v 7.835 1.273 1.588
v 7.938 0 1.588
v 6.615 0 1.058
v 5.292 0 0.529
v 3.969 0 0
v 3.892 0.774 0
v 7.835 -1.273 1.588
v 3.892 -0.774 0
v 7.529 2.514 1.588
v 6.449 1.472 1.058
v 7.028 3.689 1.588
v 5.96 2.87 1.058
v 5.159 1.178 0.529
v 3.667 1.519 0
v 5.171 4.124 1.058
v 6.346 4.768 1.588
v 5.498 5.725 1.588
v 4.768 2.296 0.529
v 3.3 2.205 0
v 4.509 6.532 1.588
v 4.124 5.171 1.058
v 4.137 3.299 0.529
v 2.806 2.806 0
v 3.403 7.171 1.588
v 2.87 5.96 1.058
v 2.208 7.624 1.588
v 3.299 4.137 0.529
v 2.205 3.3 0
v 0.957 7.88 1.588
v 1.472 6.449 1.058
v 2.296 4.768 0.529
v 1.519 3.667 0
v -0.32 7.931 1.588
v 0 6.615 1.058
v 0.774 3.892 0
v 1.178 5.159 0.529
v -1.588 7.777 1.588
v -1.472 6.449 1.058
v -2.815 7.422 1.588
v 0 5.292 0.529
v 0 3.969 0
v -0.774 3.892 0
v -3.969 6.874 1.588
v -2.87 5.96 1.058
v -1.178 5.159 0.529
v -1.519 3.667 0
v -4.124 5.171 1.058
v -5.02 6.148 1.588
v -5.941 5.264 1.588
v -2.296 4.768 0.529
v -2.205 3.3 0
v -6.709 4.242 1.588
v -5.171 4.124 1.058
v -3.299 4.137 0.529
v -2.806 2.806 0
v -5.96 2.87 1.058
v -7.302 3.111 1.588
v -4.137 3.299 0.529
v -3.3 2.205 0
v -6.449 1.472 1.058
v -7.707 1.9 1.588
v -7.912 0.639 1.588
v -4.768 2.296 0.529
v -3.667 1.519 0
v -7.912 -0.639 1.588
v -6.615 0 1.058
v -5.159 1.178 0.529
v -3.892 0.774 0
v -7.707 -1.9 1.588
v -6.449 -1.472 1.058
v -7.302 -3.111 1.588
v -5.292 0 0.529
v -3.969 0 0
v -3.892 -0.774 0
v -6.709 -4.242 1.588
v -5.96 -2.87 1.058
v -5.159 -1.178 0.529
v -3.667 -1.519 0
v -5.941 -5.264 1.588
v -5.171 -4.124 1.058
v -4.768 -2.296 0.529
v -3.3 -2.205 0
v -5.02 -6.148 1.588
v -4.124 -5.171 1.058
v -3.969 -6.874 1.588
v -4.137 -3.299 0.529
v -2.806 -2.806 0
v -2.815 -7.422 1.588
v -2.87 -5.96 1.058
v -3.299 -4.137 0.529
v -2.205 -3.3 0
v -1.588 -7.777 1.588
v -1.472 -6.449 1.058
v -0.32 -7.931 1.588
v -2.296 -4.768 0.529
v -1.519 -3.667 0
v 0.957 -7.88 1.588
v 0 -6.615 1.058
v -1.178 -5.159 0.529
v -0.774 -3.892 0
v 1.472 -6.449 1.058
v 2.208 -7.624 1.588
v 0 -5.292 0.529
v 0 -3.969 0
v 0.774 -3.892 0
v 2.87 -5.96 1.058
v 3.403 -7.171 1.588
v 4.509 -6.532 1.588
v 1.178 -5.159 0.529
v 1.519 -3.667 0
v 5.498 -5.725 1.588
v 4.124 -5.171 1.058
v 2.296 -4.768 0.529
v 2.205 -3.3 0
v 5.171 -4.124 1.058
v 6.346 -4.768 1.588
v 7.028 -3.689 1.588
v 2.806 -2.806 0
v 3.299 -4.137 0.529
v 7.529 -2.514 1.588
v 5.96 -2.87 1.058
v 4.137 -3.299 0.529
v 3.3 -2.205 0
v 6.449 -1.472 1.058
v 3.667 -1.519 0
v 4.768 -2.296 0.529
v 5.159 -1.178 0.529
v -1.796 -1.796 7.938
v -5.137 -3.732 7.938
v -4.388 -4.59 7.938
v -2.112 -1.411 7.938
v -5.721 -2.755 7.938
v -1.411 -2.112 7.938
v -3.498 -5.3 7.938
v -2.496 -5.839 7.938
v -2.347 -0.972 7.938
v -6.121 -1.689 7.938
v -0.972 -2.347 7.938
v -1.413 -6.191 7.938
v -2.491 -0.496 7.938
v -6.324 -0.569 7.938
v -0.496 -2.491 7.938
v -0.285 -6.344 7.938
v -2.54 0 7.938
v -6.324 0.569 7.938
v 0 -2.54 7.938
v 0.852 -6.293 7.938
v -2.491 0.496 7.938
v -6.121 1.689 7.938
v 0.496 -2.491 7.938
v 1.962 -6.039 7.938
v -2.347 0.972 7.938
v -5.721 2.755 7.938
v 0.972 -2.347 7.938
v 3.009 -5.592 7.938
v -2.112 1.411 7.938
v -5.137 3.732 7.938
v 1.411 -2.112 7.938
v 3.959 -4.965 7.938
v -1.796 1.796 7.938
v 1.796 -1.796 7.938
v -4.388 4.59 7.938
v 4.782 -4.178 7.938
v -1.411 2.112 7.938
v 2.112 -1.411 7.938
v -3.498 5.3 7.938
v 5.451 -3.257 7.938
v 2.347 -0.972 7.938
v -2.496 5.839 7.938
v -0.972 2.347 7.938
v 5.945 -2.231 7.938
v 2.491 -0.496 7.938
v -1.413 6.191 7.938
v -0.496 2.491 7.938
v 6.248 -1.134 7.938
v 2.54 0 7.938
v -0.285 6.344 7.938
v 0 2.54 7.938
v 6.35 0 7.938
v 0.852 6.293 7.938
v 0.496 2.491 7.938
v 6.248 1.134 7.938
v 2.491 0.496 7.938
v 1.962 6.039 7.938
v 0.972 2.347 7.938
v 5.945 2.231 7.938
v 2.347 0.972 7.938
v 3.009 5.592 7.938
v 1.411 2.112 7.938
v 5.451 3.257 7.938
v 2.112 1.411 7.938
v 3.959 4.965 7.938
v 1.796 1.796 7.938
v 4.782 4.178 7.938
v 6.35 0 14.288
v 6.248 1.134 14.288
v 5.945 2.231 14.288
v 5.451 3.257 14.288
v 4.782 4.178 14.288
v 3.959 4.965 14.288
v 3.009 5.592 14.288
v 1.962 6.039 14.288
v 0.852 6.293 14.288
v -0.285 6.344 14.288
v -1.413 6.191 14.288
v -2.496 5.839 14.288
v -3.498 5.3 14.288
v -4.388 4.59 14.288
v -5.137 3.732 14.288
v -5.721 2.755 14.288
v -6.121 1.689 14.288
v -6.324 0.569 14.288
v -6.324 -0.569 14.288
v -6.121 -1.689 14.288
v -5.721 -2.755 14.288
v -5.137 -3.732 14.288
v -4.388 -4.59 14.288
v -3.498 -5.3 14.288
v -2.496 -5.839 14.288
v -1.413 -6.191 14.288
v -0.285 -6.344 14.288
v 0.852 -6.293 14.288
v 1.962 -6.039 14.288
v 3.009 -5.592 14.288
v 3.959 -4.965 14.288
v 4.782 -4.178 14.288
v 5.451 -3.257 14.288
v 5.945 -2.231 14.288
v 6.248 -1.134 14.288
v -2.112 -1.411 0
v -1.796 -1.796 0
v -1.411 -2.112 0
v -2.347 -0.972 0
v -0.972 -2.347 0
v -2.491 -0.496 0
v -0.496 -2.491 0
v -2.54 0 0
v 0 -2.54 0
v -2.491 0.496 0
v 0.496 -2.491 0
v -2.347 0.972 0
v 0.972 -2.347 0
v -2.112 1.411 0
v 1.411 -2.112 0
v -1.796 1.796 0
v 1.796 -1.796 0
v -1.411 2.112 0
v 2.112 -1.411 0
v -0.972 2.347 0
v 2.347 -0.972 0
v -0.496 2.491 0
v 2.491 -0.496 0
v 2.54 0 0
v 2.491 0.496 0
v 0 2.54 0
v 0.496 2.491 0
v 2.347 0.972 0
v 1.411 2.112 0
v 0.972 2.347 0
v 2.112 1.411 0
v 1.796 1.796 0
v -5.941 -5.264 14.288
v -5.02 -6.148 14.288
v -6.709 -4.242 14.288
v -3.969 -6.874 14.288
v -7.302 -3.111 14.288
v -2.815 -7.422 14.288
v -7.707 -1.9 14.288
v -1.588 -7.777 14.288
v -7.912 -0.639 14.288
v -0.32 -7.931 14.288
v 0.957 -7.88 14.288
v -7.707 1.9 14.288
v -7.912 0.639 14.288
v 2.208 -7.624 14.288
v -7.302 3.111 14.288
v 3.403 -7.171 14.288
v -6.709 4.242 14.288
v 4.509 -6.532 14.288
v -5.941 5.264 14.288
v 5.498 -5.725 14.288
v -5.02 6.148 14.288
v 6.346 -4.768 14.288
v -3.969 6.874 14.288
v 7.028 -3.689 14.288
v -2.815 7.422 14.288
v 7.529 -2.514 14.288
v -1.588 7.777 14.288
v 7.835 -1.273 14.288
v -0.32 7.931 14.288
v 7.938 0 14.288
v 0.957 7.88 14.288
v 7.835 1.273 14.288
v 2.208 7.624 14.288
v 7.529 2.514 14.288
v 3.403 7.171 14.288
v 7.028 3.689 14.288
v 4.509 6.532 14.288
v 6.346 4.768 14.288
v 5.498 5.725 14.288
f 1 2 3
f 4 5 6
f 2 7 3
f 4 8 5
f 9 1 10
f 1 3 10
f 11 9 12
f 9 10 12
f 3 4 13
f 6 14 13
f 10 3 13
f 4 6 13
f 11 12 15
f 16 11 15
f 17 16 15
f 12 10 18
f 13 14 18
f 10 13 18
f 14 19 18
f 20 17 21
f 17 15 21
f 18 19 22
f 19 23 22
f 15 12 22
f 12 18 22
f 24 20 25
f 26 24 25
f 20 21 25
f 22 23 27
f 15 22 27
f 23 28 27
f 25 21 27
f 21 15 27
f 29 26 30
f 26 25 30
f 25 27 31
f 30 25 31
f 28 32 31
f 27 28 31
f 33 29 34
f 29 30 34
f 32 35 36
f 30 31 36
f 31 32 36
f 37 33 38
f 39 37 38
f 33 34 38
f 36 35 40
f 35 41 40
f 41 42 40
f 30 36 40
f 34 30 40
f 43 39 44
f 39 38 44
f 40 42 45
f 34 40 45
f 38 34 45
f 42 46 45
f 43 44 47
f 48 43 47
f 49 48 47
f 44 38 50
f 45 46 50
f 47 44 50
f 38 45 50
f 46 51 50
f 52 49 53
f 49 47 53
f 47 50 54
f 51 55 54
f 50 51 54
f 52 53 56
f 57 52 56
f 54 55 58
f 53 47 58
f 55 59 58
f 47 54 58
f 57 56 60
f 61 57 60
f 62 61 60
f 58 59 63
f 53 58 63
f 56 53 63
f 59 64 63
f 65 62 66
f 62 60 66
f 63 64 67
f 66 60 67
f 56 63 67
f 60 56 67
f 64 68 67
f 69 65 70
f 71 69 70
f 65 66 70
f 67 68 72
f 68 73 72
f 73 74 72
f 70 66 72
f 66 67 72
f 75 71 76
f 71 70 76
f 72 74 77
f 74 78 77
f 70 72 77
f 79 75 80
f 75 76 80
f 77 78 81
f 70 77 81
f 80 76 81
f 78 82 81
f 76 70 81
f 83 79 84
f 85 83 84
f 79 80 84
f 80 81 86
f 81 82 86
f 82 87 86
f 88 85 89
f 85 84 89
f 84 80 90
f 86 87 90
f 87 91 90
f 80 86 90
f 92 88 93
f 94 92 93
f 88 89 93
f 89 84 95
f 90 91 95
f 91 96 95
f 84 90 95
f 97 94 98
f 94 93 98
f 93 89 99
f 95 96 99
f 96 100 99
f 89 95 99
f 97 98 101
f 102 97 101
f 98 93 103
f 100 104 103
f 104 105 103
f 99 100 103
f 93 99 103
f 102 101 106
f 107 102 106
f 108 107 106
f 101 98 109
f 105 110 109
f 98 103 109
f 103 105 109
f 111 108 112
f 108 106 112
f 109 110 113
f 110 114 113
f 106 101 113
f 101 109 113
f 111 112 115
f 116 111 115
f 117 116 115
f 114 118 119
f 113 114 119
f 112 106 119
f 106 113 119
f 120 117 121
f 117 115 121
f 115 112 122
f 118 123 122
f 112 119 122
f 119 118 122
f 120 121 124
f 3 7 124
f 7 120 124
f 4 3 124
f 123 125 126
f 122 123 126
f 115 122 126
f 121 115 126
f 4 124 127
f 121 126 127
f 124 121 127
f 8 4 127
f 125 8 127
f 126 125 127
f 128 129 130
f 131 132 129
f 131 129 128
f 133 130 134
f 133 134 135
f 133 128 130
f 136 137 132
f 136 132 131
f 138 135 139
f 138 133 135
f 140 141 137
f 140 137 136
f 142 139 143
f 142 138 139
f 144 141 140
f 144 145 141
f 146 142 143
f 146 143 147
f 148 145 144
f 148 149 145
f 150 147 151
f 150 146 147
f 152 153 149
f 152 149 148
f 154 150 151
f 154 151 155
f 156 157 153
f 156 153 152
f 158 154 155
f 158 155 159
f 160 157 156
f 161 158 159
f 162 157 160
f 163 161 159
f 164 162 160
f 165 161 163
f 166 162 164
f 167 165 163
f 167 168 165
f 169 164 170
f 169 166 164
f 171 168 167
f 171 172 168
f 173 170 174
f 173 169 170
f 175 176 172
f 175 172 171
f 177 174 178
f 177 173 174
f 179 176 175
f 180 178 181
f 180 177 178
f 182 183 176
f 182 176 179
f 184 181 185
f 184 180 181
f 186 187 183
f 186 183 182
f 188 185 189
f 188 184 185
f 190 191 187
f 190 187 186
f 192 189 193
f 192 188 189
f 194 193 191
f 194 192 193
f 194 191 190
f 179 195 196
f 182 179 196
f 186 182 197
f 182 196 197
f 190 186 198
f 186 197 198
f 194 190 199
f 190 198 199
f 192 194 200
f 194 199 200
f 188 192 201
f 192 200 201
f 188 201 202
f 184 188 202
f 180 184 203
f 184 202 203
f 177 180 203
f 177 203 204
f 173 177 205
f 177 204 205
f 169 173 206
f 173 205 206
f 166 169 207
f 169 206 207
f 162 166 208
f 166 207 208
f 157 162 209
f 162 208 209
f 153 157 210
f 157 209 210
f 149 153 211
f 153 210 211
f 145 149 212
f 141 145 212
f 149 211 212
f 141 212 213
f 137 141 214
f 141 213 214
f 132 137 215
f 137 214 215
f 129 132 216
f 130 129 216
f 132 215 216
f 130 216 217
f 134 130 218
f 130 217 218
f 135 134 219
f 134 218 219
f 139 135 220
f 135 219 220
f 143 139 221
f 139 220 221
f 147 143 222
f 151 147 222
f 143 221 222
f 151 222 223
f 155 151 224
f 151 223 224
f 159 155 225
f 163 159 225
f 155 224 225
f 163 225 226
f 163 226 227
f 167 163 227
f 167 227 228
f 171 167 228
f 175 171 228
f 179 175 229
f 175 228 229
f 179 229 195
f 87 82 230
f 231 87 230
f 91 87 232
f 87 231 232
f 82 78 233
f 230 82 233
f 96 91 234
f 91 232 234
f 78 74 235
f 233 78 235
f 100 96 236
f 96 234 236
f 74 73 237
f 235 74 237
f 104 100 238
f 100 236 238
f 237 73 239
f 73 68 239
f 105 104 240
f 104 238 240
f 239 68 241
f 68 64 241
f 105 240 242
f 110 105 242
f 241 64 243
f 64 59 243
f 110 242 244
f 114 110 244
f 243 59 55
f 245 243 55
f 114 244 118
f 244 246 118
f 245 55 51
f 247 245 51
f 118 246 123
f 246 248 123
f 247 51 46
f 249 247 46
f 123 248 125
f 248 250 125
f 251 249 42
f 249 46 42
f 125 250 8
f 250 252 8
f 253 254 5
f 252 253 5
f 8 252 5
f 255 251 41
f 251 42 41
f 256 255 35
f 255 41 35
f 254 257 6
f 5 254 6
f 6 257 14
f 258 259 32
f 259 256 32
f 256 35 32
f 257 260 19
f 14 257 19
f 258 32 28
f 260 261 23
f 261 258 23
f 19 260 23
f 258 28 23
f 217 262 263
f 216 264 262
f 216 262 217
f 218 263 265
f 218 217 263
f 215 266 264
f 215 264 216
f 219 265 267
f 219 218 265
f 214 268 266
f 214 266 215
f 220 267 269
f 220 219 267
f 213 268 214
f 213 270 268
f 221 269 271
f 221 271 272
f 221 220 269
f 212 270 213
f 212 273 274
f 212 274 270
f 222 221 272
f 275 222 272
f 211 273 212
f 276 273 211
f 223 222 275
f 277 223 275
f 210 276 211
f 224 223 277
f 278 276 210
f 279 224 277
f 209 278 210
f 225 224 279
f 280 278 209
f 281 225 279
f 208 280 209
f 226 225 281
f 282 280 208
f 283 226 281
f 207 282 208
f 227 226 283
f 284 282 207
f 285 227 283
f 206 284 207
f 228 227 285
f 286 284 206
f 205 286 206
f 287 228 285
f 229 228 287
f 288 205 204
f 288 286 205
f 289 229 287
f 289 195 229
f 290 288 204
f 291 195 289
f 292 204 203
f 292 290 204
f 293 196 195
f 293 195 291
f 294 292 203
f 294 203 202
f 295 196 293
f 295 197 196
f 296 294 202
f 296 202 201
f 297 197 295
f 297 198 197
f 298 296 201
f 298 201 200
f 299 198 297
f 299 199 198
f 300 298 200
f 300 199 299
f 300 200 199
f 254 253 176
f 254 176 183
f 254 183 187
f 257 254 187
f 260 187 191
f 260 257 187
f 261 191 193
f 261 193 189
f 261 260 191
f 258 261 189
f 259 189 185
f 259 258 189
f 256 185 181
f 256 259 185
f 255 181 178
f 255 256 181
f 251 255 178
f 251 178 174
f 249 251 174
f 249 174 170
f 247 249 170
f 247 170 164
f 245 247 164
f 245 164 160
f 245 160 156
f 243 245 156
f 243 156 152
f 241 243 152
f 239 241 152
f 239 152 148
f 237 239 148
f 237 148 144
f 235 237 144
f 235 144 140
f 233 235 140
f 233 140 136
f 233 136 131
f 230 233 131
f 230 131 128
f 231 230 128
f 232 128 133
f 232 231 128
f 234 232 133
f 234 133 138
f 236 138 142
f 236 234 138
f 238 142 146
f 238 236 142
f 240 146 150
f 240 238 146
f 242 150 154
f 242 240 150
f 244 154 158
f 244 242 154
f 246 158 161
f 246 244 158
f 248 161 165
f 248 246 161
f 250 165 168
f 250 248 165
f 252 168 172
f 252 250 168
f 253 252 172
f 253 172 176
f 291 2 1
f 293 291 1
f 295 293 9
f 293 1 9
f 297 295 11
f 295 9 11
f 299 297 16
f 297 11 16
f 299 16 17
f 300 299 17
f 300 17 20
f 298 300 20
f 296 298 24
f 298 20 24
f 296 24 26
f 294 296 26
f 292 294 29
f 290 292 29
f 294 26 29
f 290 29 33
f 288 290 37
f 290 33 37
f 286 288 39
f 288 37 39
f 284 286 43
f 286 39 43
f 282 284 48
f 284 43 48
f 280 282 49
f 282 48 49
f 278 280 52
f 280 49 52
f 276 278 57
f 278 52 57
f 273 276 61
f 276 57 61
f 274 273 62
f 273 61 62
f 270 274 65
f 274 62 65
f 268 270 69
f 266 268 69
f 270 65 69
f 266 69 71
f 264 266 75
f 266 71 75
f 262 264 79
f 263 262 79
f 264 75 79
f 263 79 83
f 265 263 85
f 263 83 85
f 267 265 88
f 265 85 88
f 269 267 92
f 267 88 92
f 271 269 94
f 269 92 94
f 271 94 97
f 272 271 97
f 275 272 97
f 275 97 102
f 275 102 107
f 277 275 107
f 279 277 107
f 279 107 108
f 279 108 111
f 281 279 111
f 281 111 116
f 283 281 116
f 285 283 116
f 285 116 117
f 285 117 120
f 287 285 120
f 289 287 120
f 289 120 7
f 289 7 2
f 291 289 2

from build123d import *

# Parameters (mm, degrees)
F0_R     = 7.9375
F0_R_2   = 2.54
F1_DEPTH = 14.2875
F2_SIZE2 = 3.96875
F2_SIZE  = 1.5875
F3_R     = 6.35
F3_R_2   = 2.54
F4_DEPTH = 6.35


with BuildPart() as f1:
    # F0 (on Top) → F1 (new body)
    with BuildSketch(Plane.XY):
        Circle(F0_R)
        Circle(F0_R_2, mode=Mode.SUBTRACT)
    extrude(amount=F1_DEPTH)

    # F2
    f2_edges = [f1.edges().sort_by_distance(p)[0] for p in [
        (-7.9375, 0, 0),
    ]]
    chamfer(f2_edges, length=F2_SIZE, length2=F2_SIZE2)

    # F3 (on face) → F4 (cut)
    with BuildSketch(Plane.XY.offset(14.2875)):
        Circle(F3_R)
        Circle(F3_R_2, mode=Mode.SUBTRACT)
    extrude(amount=-F4_DEPTH, mode=Mode.SUBTRACT)


solid = f1.part
